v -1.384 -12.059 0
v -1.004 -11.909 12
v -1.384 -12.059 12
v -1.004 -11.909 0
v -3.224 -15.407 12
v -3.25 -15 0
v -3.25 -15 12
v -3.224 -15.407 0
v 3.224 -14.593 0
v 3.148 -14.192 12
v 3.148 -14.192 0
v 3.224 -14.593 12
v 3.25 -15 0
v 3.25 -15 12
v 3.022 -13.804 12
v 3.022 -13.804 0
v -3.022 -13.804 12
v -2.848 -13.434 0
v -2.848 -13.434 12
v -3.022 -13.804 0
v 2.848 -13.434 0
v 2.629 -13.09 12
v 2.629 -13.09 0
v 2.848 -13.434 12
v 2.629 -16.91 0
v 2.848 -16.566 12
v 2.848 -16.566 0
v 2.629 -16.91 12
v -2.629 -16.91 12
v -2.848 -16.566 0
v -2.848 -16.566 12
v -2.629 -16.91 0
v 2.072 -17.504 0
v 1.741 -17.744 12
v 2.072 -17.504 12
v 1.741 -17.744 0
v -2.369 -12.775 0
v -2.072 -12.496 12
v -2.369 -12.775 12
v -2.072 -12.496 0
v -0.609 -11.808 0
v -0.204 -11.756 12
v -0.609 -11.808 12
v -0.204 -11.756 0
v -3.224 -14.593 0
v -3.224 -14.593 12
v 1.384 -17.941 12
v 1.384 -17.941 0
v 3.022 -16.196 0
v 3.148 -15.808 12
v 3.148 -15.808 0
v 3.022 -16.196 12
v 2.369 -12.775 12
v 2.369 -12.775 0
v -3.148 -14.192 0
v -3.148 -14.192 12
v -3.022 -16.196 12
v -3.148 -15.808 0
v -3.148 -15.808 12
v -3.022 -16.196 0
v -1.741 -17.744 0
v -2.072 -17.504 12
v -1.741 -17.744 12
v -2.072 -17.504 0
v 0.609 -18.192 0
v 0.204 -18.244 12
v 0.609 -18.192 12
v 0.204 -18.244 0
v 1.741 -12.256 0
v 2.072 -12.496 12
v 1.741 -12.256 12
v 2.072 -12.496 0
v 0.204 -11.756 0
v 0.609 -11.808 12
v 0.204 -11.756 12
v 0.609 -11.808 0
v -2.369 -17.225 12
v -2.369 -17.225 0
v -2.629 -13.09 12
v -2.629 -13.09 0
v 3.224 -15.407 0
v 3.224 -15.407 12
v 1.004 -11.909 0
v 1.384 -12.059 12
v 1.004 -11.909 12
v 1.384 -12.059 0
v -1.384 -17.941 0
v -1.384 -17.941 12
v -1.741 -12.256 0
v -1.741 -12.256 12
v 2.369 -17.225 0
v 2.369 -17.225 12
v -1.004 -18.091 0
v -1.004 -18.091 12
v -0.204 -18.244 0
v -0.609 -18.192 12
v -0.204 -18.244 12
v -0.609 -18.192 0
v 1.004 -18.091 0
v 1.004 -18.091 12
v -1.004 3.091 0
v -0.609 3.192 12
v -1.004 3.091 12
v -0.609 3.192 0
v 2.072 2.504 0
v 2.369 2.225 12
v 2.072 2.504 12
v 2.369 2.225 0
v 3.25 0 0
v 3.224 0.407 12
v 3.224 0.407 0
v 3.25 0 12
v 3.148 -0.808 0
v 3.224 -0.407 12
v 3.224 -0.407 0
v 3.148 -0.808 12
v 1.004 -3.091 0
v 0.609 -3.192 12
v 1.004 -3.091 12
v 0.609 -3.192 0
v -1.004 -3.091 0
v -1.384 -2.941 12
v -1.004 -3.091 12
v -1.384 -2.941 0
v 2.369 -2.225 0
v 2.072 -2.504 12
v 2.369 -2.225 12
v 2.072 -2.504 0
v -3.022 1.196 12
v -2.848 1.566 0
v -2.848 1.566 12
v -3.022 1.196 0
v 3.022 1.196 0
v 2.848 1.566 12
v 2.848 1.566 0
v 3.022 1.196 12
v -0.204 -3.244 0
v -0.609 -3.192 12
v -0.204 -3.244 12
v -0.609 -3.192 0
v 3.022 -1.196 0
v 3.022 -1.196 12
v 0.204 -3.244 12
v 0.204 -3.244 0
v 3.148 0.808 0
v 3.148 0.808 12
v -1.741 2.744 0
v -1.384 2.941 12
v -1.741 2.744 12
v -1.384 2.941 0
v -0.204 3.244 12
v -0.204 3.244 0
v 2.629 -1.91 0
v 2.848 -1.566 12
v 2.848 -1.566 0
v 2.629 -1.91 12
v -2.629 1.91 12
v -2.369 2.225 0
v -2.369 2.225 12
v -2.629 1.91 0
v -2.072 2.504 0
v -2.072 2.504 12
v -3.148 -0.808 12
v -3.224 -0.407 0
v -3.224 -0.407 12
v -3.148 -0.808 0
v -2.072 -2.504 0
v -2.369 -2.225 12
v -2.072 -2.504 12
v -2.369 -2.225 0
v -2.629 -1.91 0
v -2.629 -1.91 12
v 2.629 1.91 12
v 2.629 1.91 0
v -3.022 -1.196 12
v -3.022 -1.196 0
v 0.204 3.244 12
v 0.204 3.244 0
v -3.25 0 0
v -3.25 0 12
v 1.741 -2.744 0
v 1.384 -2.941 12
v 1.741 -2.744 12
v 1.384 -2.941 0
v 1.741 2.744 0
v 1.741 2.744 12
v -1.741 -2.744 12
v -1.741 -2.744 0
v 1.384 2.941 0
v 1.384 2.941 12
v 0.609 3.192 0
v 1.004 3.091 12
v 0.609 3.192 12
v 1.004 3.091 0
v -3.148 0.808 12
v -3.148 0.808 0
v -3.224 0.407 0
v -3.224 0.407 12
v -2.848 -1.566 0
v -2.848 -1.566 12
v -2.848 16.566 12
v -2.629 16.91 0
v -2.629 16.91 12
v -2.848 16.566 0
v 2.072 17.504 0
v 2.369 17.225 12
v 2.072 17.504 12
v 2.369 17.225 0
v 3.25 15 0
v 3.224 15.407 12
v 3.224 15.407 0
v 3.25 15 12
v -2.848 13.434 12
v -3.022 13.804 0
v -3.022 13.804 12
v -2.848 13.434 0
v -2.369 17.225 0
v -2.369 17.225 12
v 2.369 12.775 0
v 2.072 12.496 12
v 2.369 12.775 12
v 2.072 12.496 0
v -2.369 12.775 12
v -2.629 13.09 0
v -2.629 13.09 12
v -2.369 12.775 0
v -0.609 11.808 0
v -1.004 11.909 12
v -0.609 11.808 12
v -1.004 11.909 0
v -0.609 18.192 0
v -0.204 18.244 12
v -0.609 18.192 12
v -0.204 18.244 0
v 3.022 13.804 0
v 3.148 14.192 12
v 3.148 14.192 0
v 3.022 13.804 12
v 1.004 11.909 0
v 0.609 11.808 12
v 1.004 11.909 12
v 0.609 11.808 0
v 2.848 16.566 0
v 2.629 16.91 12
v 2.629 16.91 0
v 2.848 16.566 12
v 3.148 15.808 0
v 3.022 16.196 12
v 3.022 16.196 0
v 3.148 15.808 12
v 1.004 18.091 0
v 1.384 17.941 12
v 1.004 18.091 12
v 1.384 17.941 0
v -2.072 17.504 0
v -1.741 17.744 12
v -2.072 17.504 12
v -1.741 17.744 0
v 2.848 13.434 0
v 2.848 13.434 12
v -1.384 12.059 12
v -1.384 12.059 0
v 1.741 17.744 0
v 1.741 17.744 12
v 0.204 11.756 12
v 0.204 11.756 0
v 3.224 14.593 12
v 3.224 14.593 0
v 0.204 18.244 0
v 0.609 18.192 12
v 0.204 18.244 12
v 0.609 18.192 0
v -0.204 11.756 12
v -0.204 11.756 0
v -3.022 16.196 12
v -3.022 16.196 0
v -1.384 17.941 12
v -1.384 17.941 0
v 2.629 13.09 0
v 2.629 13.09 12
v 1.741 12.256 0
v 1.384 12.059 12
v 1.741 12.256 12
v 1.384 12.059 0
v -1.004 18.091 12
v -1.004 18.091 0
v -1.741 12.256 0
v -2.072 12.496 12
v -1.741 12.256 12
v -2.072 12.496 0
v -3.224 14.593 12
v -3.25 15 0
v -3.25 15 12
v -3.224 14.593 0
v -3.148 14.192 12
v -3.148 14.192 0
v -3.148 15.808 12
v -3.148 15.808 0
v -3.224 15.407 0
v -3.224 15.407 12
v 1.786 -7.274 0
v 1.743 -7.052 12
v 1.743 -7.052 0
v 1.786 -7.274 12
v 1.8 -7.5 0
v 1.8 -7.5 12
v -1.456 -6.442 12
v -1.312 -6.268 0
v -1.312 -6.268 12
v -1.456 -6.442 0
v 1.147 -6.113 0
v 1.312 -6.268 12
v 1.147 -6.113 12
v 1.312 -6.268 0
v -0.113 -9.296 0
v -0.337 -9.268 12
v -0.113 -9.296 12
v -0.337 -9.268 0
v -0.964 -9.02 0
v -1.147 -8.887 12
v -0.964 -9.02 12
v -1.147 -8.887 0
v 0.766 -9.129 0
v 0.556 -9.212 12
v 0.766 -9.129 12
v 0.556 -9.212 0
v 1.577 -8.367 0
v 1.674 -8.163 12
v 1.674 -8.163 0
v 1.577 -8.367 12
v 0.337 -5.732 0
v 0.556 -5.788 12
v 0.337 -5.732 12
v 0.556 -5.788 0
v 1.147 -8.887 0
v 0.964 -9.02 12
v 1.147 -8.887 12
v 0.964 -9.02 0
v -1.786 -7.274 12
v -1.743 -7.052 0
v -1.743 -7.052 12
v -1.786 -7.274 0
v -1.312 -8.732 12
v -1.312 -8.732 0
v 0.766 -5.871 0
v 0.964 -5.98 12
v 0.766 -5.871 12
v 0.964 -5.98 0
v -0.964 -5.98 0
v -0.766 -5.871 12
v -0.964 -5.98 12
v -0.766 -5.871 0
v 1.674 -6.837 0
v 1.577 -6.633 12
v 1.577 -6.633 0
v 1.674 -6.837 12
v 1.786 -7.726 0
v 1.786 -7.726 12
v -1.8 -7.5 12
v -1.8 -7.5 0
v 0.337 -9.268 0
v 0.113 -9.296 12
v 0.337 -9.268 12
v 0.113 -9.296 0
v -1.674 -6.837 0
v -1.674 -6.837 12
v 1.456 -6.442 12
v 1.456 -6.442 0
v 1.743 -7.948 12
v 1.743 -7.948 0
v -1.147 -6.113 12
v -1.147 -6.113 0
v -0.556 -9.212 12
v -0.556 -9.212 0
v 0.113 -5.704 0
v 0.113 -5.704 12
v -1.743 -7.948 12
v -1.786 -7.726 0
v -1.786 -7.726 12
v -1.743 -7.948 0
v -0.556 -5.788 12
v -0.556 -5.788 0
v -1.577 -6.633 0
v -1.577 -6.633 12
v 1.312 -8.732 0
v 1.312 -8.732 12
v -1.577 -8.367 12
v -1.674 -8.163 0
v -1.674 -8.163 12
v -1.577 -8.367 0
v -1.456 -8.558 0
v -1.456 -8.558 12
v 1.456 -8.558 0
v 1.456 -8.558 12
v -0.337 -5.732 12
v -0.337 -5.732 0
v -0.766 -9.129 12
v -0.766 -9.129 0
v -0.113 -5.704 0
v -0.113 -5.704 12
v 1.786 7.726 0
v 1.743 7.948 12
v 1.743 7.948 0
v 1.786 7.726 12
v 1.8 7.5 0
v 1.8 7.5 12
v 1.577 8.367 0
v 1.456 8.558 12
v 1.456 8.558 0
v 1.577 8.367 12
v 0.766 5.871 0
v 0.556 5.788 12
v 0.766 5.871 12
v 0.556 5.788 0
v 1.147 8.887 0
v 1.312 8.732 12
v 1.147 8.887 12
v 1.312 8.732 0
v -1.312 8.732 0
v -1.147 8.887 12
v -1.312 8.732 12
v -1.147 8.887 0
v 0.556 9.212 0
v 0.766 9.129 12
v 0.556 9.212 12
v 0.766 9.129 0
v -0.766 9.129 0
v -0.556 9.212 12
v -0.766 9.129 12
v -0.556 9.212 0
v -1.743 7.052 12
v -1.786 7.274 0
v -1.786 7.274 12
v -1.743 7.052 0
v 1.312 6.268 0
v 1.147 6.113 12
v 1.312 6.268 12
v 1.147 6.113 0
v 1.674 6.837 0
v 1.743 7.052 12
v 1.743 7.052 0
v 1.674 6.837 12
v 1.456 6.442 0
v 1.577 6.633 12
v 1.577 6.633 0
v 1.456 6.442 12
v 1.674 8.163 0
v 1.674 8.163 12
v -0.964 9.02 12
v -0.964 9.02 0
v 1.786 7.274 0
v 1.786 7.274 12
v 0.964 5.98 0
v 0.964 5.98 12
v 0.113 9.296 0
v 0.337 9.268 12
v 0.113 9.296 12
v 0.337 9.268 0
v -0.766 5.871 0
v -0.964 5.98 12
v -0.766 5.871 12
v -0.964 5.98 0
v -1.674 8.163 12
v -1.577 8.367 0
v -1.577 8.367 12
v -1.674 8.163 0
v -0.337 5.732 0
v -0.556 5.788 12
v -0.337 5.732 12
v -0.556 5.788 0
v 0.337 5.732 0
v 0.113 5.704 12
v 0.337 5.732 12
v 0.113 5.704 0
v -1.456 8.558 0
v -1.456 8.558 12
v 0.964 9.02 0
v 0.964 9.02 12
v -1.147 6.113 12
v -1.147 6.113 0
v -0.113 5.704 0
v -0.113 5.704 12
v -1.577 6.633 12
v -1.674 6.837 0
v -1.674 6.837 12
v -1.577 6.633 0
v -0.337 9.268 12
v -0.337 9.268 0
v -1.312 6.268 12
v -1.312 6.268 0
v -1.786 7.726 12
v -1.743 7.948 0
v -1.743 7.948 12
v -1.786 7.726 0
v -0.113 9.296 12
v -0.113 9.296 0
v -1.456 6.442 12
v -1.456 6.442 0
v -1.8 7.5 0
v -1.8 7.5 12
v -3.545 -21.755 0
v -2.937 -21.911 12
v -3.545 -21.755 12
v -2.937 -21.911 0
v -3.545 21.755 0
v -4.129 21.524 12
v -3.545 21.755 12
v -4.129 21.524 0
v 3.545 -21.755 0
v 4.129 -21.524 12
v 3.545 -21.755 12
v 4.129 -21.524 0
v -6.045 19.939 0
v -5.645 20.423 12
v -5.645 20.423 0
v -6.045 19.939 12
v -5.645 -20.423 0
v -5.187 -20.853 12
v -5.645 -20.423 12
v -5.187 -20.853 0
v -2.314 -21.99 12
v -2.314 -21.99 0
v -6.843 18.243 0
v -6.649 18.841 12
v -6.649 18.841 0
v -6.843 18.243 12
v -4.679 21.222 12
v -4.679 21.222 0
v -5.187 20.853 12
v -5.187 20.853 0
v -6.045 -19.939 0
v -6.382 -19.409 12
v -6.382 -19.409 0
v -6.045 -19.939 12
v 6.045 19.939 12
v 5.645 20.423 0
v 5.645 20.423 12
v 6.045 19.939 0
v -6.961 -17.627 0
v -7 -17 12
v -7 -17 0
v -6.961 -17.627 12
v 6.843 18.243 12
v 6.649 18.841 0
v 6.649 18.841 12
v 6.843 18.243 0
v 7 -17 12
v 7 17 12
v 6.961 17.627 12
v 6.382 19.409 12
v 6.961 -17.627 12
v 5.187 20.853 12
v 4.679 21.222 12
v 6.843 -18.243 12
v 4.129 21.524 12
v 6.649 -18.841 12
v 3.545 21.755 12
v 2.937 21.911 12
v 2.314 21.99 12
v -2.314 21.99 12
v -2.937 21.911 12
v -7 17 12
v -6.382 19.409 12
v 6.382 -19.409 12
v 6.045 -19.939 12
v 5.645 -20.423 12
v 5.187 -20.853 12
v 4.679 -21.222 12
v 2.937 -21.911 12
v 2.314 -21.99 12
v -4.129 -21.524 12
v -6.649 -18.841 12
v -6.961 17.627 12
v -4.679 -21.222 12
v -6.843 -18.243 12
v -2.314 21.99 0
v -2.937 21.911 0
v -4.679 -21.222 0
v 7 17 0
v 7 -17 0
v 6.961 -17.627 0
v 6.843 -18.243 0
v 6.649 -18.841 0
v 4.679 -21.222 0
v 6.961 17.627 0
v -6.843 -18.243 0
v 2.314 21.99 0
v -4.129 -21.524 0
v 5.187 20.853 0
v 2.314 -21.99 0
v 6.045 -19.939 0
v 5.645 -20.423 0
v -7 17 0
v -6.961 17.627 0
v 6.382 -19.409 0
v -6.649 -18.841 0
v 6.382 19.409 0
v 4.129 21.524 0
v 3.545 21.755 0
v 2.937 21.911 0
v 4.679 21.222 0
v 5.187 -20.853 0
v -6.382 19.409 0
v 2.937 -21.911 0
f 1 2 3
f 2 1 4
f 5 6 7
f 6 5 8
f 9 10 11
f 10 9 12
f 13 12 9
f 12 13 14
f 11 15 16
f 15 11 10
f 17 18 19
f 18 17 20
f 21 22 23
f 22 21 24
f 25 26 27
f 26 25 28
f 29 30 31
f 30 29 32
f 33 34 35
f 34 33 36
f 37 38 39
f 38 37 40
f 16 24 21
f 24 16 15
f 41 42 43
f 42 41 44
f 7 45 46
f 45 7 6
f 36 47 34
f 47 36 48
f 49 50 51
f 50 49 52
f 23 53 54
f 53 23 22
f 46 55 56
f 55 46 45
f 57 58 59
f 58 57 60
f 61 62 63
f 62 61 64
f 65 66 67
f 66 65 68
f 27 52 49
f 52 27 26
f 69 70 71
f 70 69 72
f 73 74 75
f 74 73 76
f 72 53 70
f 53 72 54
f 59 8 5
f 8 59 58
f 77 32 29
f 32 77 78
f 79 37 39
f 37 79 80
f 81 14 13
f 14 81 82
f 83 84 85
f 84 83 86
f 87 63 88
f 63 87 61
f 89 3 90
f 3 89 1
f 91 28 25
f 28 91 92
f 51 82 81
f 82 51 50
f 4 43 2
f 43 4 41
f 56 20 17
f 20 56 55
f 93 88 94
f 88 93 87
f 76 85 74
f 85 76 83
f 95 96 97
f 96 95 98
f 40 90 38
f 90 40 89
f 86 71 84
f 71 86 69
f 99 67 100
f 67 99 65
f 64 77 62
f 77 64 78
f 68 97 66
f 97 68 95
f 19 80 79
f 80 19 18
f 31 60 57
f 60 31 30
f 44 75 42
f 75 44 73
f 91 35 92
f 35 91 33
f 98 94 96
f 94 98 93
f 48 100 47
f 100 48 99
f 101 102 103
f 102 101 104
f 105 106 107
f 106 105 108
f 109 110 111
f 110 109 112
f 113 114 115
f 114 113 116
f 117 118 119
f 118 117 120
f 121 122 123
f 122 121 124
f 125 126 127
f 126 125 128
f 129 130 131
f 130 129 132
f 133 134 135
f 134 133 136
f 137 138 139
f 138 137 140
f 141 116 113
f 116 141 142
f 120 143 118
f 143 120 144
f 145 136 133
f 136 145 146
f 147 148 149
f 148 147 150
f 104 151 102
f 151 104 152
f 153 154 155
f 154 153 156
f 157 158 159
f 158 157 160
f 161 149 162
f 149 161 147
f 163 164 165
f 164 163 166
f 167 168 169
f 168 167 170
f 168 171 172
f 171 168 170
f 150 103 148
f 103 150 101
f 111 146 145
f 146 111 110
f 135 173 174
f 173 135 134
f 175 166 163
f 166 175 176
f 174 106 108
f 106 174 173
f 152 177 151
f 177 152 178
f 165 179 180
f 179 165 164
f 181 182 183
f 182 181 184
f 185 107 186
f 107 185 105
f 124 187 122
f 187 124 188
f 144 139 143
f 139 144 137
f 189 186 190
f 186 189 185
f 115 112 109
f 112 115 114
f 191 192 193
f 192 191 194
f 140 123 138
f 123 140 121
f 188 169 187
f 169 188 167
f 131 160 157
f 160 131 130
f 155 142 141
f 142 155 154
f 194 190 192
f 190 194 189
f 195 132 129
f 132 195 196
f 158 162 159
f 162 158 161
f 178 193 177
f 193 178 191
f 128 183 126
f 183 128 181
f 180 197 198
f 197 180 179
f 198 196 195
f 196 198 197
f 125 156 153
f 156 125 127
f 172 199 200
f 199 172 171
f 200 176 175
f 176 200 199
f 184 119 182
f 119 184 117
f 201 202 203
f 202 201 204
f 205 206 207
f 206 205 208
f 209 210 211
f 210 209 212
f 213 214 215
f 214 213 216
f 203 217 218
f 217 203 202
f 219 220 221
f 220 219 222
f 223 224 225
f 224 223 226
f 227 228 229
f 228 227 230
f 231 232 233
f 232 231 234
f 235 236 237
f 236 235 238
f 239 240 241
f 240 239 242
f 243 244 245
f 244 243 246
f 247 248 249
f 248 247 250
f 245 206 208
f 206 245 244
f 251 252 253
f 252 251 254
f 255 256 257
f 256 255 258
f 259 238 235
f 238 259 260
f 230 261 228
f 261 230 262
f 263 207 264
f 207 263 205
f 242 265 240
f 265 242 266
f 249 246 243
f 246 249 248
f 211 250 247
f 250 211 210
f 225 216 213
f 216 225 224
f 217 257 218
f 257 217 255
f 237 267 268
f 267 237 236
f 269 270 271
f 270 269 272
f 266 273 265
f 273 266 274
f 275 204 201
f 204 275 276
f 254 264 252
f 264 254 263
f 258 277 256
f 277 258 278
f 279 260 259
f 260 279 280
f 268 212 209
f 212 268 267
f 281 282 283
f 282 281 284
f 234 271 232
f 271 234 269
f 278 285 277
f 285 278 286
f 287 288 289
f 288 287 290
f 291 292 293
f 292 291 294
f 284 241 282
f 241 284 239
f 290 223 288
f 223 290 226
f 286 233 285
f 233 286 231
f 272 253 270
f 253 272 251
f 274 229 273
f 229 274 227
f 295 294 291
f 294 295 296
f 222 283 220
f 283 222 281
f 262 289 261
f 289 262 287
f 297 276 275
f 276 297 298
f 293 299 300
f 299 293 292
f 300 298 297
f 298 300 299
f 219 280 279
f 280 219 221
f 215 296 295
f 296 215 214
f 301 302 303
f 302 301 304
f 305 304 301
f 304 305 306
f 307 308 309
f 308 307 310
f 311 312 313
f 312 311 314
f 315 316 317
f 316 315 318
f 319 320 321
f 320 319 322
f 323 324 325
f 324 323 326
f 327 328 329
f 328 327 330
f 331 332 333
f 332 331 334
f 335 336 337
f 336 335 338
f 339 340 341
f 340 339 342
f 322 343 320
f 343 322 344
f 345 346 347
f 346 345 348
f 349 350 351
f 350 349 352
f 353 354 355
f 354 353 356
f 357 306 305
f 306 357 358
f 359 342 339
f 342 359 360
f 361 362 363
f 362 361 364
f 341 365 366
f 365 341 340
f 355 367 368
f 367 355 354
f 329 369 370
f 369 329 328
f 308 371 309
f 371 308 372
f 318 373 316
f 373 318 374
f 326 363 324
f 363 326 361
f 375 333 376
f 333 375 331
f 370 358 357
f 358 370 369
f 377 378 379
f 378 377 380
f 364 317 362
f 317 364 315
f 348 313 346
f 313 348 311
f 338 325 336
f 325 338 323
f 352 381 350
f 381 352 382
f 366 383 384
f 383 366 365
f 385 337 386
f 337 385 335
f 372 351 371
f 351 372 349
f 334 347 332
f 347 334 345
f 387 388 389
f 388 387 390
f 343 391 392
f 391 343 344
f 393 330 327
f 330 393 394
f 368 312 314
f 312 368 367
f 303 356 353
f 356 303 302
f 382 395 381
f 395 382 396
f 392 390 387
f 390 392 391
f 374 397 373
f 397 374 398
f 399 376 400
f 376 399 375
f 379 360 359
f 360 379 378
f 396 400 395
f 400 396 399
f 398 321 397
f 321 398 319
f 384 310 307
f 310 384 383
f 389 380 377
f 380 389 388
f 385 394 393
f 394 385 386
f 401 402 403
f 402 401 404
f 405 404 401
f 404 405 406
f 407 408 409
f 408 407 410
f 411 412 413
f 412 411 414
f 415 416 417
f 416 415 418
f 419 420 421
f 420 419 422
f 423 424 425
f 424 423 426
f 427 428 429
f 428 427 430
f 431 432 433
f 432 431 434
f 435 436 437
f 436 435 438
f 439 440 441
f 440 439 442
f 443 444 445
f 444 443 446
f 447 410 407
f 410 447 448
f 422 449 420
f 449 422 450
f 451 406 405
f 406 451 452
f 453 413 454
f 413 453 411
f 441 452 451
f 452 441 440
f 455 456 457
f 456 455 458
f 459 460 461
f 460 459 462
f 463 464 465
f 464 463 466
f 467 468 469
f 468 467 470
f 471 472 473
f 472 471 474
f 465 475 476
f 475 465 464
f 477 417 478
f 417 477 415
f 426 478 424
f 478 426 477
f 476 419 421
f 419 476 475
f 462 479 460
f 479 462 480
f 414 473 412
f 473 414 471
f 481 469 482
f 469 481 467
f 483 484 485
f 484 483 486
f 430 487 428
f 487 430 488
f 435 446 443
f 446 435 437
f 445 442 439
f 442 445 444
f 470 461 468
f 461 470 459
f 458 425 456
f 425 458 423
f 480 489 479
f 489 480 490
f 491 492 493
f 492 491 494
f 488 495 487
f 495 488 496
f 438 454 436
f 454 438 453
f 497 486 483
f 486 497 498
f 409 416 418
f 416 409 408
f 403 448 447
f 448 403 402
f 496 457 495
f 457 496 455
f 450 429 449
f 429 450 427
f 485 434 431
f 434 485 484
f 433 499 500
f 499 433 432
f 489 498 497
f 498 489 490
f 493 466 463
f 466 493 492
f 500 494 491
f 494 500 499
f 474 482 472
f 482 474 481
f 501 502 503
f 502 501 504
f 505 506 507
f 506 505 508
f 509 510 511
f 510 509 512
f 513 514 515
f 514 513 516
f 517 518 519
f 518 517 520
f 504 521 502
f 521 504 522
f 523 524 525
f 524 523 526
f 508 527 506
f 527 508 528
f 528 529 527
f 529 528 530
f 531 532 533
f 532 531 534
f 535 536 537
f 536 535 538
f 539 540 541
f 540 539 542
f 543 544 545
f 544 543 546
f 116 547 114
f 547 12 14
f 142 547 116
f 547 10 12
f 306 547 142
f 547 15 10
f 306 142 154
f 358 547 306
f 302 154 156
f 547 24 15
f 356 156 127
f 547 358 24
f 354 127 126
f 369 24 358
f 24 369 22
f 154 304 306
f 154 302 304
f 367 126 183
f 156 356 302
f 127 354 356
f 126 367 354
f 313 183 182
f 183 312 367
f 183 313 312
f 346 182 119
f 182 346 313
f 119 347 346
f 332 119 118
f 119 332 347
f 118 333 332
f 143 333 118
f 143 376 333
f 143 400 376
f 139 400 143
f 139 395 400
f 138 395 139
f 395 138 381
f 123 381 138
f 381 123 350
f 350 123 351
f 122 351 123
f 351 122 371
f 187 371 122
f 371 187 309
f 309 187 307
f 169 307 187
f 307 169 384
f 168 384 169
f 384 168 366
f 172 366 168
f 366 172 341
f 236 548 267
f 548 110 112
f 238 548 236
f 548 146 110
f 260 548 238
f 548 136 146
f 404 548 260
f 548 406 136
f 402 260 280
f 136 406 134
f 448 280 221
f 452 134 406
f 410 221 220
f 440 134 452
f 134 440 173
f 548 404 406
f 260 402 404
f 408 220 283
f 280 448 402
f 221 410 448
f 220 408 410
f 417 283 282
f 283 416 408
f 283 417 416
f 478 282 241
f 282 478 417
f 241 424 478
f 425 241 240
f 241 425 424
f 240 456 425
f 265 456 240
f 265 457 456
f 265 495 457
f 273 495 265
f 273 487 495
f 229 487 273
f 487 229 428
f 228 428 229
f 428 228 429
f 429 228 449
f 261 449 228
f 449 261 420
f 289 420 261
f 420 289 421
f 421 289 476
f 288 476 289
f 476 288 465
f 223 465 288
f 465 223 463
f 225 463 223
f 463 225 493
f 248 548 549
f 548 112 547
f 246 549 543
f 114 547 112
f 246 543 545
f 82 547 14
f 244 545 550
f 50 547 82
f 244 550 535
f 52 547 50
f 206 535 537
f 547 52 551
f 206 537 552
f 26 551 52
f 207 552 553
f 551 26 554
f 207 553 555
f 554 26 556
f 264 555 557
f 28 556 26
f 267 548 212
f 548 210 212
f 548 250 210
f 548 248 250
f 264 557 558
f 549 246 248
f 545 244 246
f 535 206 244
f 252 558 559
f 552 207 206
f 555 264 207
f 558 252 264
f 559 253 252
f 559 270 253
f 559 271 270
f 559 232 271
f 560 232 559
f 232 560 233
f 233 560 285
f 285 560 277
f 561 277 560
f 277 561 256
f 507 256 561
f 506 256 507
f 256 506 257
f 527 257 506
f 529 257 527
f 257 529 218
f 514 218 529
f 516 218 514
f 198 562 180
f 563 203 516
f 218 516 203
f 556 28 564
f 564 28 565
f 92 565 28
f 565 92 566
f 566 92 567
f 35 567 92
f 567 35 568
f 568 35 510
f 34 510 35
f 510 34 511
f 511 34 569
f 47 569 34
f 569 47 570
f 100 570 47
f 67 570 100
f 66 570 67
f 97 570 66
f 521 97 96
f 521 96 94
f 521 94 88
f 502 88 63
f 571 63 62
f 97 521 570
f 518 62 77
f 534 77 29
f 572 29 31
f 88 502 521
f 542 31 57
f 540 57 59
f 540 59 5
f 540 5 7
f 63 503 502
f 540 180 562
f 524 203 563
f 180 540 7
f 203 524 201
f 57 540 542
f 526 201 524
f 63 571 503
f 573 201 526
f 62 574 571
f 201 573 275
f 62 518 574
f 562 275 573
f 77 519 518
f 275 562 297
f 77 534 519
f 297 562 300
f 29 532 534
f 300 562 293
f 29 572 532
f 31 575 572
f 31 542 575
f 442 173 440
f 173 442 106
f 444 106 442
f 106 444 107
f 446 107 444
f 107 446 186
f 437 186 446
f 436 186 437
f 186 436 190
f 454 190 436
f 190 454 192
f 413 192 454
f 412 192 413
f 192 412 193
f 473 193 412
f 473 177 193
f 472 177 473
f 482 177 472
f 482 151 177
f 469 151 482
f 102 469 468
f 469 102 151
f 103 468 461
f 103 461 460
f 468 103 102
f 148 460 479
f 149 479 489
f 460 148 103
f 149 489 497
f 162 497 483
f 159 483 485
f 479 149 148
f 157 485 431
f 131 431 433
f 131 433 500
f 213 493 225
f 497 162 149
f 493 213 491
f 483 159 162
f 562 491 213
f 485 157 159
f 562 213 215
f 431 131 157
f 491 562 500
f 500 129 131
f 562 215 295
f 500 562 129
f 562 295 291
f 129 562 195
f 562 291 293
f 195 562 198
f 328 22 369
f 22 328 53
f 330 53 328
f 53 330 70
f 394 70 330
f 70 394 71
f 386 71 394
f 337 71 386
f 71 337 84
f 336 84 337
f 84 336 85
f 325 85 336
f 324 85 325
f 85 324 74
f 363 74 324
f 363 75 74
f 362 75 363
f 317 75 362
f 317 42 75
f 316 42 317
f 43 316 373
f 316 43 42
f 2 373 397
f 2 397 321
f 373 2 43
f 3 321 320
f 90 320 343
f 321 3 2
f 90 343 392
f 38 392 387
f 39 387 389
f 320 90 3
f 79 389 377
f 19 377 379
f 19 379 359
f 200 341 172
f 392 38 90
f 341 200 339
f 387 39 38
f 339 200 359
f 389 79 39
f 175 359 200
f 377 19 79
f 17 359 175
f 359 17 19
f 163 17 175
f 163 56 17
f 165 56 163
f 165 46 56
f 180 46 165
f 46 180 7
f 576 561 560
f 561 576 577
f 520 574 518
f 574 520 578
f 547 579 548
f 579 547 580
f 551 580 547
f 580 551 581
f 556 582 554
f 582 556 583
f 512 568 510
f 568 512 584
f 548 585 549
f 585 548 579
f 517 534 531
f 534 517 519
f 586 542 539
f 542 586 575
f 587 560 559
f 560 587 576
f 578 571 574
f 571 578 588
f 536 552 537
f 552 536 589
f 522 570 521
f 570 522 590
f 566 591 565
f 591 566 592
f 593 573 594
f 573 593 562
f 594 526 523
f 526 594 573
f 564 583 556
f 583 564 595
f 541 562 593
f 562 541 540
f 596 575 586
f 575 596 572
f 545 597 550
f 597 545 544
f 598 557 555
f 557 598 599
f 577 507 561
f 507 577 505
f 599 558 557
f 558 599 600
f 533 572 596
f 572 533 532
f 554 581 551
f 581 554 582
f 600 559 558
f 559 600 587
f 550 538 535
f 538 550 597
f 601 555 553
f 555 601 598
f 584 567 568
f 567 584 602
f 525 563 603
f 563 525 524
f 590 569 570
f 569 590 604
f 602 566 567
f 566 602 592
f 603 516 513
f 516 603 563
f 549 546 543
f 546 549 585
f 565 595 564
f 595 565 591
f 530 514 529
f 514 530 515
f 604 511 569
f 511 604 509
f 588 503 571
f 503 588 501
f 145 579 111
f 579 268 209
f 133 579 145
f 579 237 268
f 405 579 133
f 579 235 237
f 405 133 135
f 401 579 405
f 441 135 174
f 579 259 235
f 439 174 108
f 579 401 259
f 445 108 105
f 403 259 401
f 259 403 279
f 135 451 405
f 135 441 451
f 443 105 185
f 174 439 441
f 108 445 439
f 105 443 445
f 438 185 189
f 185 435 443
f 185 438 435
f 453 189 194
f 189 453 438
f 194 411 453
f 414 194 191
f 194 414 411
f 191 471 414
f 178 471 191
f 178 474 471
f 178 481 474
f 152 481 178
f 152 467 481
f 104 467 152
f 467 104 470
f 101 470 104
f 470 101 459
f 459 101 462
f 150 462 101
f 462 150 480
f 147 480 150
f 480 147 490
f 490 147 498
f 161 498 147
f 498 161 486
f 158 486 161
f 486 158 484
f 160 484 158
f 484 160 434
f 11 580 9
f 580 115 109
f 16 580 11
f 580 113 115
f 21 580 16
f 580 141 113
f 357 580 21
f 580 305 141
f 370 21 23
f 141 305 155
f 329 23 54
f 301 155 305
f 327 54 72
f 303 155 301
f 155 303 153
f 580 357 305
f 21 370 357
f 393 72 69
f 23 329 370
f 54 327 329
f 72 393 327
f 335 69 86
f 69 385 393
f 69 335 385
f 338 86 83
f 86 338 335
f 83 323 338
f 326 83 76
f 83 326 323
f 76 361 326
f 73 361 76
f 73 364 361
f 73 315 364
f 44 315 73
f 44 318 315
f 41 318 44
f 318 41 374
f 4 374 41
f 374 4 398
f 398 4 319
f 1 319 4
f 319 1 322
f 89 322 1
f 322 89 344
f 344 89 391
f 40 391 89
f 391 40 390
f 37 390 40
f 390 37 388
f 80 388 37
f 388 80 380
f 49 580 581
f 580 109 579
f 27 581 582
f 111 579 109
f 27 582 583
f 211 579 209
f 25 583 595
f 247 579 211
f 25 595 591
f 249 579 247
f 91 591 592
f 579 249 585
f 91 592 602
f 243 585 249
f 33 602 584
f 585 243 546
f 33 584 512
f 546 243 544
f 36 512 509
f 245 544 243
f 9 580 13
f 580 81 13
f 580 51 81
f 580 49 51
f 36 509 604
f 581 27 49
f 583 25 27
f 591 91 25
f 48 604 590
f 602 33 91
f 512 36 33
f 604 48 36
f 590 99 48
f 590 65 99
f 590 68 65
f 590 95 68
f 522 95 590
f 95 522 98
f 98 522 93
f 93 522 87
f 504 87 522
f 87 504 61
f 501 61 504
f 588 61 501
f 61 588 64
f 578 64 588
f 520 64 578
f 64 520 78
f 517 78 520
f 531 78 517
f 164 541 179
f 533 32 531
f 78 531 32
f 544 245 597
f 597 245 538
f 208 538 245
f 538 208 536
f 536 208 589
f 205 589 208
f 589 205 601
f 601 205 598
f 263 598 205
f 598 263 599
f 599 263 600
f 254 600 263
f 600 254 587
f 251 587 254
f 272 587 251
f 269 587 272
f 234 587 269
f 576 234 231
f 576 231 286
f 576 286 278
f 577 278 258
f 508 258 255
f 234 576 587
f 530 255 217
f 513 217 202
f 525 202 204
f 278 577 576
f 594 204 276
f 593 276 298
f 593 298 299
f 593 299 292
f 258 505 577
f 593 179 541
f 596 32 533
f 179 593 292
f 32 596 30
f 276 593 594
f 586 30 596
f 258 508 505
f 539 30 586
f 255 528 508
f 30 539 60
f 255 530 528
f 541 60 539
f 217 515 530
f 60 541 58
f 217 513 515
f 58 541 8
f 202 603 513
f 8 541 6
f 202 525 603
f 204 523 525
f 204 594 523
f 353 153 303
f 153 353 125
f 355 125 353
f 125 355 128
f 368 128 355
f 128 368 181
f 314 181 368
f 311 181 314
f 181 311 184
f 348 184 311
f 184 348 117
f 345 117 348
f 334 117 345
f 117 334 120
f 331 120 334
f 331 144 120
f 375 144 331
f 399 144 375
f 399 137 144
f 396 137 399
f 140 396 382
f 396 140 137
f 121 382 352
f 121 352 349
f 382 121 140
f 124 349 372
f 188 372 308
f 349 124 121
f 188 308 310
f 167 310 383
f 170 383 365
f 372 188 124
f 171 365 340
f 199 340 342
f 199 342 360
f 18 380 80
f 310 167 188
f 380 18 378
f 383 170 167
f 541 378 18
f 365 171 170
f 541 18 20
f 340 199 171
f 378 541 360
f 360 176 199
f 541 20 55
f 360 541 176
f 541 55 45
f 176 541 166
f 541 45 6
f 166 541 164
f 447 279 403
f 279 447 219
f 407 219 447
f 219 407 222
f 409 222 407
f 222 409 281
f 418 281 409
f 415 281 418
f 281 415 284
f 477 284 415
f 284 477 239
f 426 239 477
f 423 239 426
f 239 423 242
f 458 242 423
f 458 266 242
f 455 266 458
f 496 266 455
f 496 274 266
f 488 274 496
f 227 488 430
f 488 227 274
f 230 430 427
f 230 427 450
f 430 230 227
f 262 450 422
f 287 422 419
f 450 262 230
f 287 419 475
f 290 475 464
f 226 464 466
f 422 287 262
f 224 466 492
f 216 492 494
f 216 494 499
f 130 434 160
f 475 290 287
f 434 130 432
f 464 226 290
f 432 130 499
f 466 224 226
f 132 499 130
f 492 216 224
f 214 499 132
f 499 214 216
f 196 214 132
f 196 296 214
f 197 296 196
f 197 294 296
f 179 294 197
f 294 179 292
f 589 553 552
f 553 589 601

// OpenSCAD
$fn = 50;

difference() {
	union() {
		hull() {
			translate(v = [-2.0, 17.0, 0]) {
				cylinder(h = 12, r = 5);
			}
			translate(v = [2.0, 17.0, 0]) {
				cylinder(h = 12, r = 5);
			}
			translate(v = [-2.0, -17.0, 0]) {
				cylinder(h = 12, r = 5);
			}
			translate(v = [2.0, -17.0, 0]) {
				cylinder(h = 12, r = 5);
			}
		}
	}
	union() {
		translate(v = [0.0, -15.0, 0]) {
			translate(v = [0, 0, -100]) {
				cylinder(h = 200, r = 3.25);
			}
		}
		translate(v = [0, 0, -100]) {
			cylinder(h = 200, r = 3.25);
		}
		translate(v = [0.0, 15.0, 0]) {
			translate(v = [0, 0, -100]) {
				cylinder(h = 200, r = 3.25);
			}
		}
		translate(v = [0.0, -15.0, 0]) {
			translate(v = [0, 0, -100]) {
				cylinder(h = 200, r = 1.8);
			}
		}
		translate(v = [0.0, -7.5, 0]) {
			translate(v = [0, 0, -100]) {
				cylinder(h = 200, r = 1.8);
			}
		}
		translate(v = [0, 0, -100]) {
			cylinder(h = 200, r = 1.8);
		}
		translate(v = [0.0, 7.5, 0]) {
			translate(v = [0, 0, -100]) {
				cylinder(h = 200, r = 1.8);
			}
		}
		translate(v = [0.0, 15.0, 0]) {
			translate(v = [0, 0, -100]) {
				cylinder(h = 200, r = 1.8);
			}
		}
	}
}
